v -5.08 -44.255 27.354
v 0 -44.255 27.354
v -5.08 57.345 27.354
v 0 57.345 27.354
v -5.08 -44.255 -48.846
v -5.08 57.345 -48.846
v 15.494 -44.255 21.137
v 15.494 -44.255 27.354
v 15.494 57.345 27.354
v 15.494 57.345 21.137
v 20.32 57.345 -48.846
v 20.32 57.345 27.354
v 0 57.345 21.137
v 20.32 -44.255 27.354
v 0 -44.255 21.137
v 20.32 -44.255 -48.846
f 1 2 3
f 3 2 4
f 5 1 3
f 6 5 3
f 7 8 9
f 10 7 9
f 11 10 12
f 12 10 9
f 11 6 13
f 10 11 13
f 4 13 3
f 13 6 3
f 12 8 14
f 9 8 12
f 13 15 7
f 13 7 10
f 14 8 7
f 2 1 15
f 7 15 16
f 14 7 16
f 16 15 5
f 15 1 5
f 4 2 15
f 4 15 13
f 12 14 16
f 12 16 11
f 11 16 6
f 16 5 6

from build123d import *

# Parameters (mm, degrees)
F0_W     = 101.6
F0_H     = 6.21665
F0_H_2   = 69.98335
F1_DEPTH = 5.08
F2_DEPTH = 15.494
F3_START = 15.494
F3_DEPTH = 4.826


with BuildPart() as f1:
    # F0 (on Right) → F1 (new body)
    with BuildSketch(Plane.YZ):
        with Locations((6.5453828692, 24.245519595)):
            Rectangle(F0_W, F0_H)
        with Locations((6.5453828692, -13.854480405)):
            Rectangle(F0_W, F0_H_2)
    extrude(amount=-F1_DEPTH)

    # F0 (on Right) → F2 (join)
    with BuildSketch(Plane.YZ):
        with Locations((6.5453828692, -13.854480405)):
            Rectangle(F0_W, F0_H_2)
    extrude(amount=F2_DEPTH)

    # F0 (on Right) → F3 (join)
    with BuildSketch(Plane.YZ.offset(F3_START)):
        with Locations((6.5453828692, 24.245519595)):
            Rectangle(F0_W, F0_H)
        with Locations((6.5453828692, -13.854480405)):
            Rectangle(F0_W, F0_H_2)
    extrude(amount=F3_DEPTH)


solid = f1.part
